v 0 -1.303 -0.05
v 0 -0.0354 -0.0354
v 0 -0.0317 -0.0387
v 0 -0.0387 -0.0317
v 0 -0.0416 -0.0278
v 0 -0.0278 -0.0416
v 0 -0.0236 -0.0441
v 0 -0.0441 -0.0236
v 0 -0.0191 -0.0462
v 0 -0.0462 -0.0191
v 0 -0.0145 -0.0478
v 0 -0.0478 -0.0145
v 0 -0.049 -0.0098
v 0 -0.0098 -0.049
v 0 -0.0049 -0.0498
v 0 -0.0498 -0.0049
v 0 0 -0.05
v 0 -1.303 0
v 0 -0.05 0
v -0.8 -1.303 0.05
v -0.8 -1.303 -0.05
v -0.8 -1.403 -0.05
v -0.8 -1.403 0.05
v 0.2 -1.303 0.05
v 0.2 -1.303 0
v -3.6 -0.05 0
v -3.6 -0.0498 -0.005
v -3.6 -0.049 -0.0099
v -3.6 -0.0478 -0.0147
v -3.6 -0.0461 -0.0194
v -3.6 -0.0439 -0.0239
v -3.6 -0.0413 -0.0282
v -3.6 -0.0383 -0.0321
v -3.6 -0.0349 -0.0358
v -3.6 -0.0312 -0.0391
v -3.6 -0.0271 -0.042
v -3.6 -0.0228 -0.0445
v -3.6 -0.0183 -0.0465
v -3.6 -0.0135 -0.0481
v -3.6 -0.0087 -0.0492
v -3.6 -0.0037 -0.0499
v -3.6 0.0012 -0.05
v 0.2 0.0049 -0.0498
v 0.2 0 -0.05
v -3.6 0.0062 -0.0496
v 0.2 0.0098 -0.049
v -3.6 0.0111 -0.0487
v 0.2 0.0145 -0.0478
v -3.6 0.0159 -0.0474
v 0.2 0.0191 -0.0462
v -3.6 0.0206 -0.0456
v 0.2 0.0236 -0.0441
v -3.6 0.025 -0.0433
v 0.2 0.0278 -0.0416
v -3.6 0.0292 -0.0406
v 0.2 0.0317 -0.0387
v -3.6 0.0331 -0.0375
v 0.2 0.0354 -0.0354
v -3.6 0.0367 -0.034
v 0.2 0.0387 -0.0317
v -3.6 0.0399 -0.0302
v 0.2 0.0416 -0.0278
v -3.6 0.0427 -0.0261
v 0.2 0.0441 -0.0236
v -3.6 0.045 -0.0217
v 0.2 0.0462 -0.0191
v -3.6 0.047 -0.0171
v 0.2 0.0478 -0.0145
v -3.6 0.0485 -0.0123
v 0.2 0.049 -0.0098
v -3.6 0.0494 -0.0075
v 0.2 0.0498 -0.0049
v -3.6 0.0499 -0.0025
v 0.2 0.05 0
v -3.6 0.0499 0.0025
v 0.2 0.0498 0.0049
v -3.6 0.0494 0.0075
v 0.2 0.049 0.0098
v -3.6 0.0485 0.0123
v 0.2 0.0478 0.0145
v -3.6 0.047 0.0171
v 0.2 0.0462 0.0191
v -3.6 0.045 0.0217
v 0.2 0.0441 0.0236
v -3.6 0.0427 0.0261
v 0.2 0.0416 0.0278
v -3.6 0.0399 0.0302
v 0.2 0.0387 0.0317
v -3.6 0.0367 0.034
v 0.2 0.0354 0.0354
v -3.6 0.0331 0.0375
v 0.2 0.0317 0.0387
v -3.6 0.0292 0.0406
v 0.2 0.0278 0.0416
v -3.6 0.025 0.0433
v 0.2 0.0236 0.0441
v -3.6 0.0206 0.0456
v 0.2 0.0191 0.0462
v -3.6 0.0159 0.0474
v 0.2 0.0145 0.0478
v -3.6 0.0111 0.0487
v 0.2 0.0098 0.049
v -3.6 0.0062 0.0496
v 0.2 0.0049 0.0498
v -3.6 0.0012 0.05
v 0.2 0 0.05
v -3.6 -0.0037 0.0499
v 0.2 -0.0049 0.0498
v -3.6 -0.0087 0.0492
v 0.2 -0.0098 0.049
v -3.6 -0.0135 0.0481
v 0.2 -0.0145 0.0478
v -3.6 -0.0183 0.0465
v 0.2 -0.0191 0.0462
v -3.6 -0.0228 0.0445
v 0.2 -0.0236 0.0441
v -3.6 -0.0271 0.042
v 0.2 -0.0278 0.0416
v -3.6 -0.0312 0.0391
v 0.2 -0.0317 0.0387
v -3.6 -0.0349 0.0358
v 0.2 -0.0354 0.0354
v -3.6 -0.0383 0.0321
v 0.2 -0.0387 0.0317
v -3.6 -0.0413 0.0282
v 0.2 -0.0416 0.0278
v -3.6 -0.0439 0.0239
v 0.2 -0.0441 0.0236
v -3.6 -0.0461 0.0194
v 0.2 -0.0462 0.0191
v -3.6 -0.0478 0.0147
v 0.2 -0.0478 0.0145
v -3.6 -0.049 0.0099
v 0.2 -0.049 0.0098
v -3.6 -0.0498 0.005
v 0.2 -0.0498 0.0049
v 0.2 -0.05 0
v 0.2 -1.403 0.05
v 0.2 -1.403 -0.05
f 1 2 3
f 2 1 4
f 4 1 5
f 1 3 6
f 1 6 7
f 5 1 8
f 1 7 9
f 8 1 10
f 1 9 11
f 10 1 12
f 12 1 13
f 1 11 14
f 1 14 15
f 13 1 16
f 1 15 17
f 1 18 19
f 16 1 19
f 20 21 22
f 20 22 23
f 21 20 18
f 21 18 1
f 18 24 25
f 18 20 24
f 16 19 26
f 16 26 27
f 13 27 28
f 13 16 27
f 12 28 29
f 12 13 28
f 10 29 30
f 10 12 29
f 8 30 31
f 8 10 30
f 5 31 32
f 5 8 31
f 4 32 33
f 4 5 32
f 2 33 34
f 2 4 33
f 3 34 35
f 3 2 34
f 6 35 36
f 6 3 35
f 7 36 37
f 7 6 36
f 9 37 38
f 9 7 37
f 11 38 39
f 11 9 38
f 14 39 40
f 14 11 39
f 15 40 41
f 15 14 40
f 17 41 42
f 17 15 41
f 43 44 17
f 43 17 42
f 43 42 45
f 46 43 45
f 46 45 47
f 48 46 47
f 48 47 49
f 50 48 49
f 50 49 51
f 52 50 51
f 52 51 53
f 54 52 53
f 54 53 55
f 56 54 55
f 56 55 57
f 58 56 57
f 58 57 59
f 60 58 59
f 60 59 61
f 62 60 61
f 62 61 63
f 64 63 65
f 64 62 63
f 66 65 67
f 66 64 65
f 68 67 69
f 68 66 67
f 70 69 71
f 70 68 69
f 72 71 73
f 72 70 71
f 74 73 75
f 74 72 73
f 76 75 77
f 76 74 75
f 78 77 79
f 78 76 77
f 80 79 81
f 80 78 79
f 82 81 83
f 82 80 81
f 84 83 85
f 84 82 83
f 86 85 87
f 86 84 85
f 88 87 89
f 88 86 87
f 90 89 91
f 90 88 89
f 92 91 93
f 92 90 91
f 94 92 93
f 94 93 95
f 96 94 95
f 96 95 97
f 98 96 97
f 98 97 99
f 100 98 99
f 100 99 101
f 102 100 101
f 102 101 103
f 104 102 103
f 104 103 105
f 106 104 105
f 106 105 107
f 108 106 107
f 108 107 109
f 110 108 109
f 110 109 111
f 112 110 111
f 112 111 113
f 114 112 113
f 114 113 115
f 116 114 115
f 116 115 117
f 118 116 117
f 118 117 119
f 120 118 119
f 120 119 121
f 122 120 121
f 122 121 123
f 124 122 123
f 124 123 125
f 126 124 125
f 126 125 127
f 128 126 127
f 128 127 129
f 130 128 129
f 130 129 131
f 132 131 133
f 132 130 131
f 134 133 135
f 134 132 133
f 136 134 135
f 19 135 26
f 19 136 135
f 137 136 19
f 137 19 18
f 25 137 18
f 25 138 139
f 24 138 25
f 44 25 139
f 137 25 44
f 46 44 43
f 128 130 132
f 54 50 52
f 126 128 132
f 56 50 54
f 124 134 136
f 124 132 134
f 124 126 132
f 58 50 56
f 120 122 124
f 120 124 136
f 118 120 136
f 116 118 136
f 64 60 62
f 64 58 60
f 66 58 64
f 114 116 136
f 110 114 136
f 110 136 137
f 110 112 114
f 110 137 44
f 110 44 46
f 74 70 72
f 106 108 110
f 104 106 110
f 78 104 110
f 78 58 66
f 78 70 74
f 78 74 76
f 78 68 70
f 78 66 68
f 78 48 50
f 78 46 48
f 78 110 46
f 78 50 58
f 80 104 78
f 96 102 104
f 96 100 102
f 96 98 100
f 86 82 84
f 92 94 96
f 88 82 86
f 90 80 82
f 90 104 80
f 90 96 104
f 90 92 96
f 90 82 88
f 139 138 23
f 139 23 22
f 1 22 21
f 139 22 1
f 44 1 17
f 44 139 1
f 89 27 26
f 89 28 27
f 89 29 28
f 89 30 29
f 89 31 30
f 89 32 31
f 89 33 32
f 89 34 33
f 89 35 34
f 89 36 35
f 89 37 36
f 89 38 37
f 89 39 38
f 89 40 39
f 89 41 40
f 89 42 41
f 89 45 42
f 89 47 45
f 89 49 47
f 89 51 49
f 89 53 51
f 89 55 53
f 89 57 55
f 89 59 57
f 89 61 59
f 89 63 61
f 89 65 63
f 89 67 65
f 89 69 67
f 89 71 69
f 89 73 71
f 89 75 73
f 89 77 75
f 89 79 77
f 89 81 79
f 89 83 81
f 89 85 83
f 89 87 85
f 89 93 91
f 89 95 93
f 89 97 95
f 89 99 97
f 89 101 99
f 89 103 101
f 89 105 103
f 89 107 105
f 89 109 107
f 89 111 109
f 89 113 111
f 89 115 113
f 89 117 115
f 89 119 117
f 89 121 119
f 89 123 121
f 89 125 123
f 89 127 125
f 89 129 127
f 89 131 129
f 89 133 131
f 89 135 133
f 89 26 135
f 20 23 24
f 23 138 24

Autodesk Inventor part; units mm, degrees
ref_plane "YZ Plane" through (0, 0, 0) normal (1, 0, 0) x (0, 1, 0)
ref_plane "XZ Plane" through (0, 0, 0) normal (0, 1, 0) x (-1, 0, 0)
ref_plane "XY Plane" through (0, 0, 0) normal (0, 0, 1) x (1, 0, 0)
sketch "Sketch1" plane through (0, 0, 0) normal (1, 0, 0) x (0, 1, 0)
  circle A0 centre (0, 0) radius 0.05
  line L0 (0, 0) -> (-1.353, 0)
  line L1 (-1.403, 0.05) -> (-1.303, 0.05)
  line L2 (-1.303, 0.05) -> (-1.303, -0.05)
  line L3 (-1.303, -0.05) -> (-1.403, -0.05)
  line L4 (-1.403, -0.05) -> (-1.403, 0.05)
  line L5 (-1.403, 0.05) -> (-1.303, -0.05) construction
  line L6 (-1.303, 0.05) -> (-1.403, -0.05) construction
  line L7 (-1.303, -0.05) -> (0, -0.05)
  point P0 (-0.05, 0)
  point P1 (-1.303, 0)
  dimension "d0" = 0.1
  dimension "d1" = 1.353
  dimension "d2" = 0.1
  dimension "d3" = 0.1
extrude "Extrusion1" add sketch "Sketch1" along normal blind 0.2
sketch "Sketch2" plane through (0, 0, 0) normal (-1, 0, 0) x (0, 0, 1)
  arc A0 (0, -0.05) -> (-0.05, 0) centre (0, 0) ccw projected
  circle A1 centre (0, 0) radius 0.05
  point P0 (-0.05, 0)
  point P1 (0, -0.05)
  dimension "d6" = 0.1
extrude "Extrusion2" add sketch "Sketch2" along normal blind 3.6
sketch "Sketch3" plane through (0, 0, 0) normal (-1, 0, 0) x (0, 0, 1)
  line L0 (-0.05, -1.403) -> (-0.05, 0) projected
  line L1 (0.05, -1.403) -> (-0.05, -1.403) projected
  line L2 (-0.05, -1.403) -> (0.05, -1.403)
  line L3 (0, -1.303) -> (0.05, -1.303) projected
  line L4 (0.05, -1.403) -> (0.05, -1.303)
  line L5 (0.05, -1.303) -> (-0.05, -1.303)
  line L6 (-0.05, -1.303) -> (-0.05, -1.403)
  point P0 (0, 0)
extrude "Extrusion3" add sketch "Sketch3" along normal blind 0.8
properties part number "Bone24_23_Fix"
